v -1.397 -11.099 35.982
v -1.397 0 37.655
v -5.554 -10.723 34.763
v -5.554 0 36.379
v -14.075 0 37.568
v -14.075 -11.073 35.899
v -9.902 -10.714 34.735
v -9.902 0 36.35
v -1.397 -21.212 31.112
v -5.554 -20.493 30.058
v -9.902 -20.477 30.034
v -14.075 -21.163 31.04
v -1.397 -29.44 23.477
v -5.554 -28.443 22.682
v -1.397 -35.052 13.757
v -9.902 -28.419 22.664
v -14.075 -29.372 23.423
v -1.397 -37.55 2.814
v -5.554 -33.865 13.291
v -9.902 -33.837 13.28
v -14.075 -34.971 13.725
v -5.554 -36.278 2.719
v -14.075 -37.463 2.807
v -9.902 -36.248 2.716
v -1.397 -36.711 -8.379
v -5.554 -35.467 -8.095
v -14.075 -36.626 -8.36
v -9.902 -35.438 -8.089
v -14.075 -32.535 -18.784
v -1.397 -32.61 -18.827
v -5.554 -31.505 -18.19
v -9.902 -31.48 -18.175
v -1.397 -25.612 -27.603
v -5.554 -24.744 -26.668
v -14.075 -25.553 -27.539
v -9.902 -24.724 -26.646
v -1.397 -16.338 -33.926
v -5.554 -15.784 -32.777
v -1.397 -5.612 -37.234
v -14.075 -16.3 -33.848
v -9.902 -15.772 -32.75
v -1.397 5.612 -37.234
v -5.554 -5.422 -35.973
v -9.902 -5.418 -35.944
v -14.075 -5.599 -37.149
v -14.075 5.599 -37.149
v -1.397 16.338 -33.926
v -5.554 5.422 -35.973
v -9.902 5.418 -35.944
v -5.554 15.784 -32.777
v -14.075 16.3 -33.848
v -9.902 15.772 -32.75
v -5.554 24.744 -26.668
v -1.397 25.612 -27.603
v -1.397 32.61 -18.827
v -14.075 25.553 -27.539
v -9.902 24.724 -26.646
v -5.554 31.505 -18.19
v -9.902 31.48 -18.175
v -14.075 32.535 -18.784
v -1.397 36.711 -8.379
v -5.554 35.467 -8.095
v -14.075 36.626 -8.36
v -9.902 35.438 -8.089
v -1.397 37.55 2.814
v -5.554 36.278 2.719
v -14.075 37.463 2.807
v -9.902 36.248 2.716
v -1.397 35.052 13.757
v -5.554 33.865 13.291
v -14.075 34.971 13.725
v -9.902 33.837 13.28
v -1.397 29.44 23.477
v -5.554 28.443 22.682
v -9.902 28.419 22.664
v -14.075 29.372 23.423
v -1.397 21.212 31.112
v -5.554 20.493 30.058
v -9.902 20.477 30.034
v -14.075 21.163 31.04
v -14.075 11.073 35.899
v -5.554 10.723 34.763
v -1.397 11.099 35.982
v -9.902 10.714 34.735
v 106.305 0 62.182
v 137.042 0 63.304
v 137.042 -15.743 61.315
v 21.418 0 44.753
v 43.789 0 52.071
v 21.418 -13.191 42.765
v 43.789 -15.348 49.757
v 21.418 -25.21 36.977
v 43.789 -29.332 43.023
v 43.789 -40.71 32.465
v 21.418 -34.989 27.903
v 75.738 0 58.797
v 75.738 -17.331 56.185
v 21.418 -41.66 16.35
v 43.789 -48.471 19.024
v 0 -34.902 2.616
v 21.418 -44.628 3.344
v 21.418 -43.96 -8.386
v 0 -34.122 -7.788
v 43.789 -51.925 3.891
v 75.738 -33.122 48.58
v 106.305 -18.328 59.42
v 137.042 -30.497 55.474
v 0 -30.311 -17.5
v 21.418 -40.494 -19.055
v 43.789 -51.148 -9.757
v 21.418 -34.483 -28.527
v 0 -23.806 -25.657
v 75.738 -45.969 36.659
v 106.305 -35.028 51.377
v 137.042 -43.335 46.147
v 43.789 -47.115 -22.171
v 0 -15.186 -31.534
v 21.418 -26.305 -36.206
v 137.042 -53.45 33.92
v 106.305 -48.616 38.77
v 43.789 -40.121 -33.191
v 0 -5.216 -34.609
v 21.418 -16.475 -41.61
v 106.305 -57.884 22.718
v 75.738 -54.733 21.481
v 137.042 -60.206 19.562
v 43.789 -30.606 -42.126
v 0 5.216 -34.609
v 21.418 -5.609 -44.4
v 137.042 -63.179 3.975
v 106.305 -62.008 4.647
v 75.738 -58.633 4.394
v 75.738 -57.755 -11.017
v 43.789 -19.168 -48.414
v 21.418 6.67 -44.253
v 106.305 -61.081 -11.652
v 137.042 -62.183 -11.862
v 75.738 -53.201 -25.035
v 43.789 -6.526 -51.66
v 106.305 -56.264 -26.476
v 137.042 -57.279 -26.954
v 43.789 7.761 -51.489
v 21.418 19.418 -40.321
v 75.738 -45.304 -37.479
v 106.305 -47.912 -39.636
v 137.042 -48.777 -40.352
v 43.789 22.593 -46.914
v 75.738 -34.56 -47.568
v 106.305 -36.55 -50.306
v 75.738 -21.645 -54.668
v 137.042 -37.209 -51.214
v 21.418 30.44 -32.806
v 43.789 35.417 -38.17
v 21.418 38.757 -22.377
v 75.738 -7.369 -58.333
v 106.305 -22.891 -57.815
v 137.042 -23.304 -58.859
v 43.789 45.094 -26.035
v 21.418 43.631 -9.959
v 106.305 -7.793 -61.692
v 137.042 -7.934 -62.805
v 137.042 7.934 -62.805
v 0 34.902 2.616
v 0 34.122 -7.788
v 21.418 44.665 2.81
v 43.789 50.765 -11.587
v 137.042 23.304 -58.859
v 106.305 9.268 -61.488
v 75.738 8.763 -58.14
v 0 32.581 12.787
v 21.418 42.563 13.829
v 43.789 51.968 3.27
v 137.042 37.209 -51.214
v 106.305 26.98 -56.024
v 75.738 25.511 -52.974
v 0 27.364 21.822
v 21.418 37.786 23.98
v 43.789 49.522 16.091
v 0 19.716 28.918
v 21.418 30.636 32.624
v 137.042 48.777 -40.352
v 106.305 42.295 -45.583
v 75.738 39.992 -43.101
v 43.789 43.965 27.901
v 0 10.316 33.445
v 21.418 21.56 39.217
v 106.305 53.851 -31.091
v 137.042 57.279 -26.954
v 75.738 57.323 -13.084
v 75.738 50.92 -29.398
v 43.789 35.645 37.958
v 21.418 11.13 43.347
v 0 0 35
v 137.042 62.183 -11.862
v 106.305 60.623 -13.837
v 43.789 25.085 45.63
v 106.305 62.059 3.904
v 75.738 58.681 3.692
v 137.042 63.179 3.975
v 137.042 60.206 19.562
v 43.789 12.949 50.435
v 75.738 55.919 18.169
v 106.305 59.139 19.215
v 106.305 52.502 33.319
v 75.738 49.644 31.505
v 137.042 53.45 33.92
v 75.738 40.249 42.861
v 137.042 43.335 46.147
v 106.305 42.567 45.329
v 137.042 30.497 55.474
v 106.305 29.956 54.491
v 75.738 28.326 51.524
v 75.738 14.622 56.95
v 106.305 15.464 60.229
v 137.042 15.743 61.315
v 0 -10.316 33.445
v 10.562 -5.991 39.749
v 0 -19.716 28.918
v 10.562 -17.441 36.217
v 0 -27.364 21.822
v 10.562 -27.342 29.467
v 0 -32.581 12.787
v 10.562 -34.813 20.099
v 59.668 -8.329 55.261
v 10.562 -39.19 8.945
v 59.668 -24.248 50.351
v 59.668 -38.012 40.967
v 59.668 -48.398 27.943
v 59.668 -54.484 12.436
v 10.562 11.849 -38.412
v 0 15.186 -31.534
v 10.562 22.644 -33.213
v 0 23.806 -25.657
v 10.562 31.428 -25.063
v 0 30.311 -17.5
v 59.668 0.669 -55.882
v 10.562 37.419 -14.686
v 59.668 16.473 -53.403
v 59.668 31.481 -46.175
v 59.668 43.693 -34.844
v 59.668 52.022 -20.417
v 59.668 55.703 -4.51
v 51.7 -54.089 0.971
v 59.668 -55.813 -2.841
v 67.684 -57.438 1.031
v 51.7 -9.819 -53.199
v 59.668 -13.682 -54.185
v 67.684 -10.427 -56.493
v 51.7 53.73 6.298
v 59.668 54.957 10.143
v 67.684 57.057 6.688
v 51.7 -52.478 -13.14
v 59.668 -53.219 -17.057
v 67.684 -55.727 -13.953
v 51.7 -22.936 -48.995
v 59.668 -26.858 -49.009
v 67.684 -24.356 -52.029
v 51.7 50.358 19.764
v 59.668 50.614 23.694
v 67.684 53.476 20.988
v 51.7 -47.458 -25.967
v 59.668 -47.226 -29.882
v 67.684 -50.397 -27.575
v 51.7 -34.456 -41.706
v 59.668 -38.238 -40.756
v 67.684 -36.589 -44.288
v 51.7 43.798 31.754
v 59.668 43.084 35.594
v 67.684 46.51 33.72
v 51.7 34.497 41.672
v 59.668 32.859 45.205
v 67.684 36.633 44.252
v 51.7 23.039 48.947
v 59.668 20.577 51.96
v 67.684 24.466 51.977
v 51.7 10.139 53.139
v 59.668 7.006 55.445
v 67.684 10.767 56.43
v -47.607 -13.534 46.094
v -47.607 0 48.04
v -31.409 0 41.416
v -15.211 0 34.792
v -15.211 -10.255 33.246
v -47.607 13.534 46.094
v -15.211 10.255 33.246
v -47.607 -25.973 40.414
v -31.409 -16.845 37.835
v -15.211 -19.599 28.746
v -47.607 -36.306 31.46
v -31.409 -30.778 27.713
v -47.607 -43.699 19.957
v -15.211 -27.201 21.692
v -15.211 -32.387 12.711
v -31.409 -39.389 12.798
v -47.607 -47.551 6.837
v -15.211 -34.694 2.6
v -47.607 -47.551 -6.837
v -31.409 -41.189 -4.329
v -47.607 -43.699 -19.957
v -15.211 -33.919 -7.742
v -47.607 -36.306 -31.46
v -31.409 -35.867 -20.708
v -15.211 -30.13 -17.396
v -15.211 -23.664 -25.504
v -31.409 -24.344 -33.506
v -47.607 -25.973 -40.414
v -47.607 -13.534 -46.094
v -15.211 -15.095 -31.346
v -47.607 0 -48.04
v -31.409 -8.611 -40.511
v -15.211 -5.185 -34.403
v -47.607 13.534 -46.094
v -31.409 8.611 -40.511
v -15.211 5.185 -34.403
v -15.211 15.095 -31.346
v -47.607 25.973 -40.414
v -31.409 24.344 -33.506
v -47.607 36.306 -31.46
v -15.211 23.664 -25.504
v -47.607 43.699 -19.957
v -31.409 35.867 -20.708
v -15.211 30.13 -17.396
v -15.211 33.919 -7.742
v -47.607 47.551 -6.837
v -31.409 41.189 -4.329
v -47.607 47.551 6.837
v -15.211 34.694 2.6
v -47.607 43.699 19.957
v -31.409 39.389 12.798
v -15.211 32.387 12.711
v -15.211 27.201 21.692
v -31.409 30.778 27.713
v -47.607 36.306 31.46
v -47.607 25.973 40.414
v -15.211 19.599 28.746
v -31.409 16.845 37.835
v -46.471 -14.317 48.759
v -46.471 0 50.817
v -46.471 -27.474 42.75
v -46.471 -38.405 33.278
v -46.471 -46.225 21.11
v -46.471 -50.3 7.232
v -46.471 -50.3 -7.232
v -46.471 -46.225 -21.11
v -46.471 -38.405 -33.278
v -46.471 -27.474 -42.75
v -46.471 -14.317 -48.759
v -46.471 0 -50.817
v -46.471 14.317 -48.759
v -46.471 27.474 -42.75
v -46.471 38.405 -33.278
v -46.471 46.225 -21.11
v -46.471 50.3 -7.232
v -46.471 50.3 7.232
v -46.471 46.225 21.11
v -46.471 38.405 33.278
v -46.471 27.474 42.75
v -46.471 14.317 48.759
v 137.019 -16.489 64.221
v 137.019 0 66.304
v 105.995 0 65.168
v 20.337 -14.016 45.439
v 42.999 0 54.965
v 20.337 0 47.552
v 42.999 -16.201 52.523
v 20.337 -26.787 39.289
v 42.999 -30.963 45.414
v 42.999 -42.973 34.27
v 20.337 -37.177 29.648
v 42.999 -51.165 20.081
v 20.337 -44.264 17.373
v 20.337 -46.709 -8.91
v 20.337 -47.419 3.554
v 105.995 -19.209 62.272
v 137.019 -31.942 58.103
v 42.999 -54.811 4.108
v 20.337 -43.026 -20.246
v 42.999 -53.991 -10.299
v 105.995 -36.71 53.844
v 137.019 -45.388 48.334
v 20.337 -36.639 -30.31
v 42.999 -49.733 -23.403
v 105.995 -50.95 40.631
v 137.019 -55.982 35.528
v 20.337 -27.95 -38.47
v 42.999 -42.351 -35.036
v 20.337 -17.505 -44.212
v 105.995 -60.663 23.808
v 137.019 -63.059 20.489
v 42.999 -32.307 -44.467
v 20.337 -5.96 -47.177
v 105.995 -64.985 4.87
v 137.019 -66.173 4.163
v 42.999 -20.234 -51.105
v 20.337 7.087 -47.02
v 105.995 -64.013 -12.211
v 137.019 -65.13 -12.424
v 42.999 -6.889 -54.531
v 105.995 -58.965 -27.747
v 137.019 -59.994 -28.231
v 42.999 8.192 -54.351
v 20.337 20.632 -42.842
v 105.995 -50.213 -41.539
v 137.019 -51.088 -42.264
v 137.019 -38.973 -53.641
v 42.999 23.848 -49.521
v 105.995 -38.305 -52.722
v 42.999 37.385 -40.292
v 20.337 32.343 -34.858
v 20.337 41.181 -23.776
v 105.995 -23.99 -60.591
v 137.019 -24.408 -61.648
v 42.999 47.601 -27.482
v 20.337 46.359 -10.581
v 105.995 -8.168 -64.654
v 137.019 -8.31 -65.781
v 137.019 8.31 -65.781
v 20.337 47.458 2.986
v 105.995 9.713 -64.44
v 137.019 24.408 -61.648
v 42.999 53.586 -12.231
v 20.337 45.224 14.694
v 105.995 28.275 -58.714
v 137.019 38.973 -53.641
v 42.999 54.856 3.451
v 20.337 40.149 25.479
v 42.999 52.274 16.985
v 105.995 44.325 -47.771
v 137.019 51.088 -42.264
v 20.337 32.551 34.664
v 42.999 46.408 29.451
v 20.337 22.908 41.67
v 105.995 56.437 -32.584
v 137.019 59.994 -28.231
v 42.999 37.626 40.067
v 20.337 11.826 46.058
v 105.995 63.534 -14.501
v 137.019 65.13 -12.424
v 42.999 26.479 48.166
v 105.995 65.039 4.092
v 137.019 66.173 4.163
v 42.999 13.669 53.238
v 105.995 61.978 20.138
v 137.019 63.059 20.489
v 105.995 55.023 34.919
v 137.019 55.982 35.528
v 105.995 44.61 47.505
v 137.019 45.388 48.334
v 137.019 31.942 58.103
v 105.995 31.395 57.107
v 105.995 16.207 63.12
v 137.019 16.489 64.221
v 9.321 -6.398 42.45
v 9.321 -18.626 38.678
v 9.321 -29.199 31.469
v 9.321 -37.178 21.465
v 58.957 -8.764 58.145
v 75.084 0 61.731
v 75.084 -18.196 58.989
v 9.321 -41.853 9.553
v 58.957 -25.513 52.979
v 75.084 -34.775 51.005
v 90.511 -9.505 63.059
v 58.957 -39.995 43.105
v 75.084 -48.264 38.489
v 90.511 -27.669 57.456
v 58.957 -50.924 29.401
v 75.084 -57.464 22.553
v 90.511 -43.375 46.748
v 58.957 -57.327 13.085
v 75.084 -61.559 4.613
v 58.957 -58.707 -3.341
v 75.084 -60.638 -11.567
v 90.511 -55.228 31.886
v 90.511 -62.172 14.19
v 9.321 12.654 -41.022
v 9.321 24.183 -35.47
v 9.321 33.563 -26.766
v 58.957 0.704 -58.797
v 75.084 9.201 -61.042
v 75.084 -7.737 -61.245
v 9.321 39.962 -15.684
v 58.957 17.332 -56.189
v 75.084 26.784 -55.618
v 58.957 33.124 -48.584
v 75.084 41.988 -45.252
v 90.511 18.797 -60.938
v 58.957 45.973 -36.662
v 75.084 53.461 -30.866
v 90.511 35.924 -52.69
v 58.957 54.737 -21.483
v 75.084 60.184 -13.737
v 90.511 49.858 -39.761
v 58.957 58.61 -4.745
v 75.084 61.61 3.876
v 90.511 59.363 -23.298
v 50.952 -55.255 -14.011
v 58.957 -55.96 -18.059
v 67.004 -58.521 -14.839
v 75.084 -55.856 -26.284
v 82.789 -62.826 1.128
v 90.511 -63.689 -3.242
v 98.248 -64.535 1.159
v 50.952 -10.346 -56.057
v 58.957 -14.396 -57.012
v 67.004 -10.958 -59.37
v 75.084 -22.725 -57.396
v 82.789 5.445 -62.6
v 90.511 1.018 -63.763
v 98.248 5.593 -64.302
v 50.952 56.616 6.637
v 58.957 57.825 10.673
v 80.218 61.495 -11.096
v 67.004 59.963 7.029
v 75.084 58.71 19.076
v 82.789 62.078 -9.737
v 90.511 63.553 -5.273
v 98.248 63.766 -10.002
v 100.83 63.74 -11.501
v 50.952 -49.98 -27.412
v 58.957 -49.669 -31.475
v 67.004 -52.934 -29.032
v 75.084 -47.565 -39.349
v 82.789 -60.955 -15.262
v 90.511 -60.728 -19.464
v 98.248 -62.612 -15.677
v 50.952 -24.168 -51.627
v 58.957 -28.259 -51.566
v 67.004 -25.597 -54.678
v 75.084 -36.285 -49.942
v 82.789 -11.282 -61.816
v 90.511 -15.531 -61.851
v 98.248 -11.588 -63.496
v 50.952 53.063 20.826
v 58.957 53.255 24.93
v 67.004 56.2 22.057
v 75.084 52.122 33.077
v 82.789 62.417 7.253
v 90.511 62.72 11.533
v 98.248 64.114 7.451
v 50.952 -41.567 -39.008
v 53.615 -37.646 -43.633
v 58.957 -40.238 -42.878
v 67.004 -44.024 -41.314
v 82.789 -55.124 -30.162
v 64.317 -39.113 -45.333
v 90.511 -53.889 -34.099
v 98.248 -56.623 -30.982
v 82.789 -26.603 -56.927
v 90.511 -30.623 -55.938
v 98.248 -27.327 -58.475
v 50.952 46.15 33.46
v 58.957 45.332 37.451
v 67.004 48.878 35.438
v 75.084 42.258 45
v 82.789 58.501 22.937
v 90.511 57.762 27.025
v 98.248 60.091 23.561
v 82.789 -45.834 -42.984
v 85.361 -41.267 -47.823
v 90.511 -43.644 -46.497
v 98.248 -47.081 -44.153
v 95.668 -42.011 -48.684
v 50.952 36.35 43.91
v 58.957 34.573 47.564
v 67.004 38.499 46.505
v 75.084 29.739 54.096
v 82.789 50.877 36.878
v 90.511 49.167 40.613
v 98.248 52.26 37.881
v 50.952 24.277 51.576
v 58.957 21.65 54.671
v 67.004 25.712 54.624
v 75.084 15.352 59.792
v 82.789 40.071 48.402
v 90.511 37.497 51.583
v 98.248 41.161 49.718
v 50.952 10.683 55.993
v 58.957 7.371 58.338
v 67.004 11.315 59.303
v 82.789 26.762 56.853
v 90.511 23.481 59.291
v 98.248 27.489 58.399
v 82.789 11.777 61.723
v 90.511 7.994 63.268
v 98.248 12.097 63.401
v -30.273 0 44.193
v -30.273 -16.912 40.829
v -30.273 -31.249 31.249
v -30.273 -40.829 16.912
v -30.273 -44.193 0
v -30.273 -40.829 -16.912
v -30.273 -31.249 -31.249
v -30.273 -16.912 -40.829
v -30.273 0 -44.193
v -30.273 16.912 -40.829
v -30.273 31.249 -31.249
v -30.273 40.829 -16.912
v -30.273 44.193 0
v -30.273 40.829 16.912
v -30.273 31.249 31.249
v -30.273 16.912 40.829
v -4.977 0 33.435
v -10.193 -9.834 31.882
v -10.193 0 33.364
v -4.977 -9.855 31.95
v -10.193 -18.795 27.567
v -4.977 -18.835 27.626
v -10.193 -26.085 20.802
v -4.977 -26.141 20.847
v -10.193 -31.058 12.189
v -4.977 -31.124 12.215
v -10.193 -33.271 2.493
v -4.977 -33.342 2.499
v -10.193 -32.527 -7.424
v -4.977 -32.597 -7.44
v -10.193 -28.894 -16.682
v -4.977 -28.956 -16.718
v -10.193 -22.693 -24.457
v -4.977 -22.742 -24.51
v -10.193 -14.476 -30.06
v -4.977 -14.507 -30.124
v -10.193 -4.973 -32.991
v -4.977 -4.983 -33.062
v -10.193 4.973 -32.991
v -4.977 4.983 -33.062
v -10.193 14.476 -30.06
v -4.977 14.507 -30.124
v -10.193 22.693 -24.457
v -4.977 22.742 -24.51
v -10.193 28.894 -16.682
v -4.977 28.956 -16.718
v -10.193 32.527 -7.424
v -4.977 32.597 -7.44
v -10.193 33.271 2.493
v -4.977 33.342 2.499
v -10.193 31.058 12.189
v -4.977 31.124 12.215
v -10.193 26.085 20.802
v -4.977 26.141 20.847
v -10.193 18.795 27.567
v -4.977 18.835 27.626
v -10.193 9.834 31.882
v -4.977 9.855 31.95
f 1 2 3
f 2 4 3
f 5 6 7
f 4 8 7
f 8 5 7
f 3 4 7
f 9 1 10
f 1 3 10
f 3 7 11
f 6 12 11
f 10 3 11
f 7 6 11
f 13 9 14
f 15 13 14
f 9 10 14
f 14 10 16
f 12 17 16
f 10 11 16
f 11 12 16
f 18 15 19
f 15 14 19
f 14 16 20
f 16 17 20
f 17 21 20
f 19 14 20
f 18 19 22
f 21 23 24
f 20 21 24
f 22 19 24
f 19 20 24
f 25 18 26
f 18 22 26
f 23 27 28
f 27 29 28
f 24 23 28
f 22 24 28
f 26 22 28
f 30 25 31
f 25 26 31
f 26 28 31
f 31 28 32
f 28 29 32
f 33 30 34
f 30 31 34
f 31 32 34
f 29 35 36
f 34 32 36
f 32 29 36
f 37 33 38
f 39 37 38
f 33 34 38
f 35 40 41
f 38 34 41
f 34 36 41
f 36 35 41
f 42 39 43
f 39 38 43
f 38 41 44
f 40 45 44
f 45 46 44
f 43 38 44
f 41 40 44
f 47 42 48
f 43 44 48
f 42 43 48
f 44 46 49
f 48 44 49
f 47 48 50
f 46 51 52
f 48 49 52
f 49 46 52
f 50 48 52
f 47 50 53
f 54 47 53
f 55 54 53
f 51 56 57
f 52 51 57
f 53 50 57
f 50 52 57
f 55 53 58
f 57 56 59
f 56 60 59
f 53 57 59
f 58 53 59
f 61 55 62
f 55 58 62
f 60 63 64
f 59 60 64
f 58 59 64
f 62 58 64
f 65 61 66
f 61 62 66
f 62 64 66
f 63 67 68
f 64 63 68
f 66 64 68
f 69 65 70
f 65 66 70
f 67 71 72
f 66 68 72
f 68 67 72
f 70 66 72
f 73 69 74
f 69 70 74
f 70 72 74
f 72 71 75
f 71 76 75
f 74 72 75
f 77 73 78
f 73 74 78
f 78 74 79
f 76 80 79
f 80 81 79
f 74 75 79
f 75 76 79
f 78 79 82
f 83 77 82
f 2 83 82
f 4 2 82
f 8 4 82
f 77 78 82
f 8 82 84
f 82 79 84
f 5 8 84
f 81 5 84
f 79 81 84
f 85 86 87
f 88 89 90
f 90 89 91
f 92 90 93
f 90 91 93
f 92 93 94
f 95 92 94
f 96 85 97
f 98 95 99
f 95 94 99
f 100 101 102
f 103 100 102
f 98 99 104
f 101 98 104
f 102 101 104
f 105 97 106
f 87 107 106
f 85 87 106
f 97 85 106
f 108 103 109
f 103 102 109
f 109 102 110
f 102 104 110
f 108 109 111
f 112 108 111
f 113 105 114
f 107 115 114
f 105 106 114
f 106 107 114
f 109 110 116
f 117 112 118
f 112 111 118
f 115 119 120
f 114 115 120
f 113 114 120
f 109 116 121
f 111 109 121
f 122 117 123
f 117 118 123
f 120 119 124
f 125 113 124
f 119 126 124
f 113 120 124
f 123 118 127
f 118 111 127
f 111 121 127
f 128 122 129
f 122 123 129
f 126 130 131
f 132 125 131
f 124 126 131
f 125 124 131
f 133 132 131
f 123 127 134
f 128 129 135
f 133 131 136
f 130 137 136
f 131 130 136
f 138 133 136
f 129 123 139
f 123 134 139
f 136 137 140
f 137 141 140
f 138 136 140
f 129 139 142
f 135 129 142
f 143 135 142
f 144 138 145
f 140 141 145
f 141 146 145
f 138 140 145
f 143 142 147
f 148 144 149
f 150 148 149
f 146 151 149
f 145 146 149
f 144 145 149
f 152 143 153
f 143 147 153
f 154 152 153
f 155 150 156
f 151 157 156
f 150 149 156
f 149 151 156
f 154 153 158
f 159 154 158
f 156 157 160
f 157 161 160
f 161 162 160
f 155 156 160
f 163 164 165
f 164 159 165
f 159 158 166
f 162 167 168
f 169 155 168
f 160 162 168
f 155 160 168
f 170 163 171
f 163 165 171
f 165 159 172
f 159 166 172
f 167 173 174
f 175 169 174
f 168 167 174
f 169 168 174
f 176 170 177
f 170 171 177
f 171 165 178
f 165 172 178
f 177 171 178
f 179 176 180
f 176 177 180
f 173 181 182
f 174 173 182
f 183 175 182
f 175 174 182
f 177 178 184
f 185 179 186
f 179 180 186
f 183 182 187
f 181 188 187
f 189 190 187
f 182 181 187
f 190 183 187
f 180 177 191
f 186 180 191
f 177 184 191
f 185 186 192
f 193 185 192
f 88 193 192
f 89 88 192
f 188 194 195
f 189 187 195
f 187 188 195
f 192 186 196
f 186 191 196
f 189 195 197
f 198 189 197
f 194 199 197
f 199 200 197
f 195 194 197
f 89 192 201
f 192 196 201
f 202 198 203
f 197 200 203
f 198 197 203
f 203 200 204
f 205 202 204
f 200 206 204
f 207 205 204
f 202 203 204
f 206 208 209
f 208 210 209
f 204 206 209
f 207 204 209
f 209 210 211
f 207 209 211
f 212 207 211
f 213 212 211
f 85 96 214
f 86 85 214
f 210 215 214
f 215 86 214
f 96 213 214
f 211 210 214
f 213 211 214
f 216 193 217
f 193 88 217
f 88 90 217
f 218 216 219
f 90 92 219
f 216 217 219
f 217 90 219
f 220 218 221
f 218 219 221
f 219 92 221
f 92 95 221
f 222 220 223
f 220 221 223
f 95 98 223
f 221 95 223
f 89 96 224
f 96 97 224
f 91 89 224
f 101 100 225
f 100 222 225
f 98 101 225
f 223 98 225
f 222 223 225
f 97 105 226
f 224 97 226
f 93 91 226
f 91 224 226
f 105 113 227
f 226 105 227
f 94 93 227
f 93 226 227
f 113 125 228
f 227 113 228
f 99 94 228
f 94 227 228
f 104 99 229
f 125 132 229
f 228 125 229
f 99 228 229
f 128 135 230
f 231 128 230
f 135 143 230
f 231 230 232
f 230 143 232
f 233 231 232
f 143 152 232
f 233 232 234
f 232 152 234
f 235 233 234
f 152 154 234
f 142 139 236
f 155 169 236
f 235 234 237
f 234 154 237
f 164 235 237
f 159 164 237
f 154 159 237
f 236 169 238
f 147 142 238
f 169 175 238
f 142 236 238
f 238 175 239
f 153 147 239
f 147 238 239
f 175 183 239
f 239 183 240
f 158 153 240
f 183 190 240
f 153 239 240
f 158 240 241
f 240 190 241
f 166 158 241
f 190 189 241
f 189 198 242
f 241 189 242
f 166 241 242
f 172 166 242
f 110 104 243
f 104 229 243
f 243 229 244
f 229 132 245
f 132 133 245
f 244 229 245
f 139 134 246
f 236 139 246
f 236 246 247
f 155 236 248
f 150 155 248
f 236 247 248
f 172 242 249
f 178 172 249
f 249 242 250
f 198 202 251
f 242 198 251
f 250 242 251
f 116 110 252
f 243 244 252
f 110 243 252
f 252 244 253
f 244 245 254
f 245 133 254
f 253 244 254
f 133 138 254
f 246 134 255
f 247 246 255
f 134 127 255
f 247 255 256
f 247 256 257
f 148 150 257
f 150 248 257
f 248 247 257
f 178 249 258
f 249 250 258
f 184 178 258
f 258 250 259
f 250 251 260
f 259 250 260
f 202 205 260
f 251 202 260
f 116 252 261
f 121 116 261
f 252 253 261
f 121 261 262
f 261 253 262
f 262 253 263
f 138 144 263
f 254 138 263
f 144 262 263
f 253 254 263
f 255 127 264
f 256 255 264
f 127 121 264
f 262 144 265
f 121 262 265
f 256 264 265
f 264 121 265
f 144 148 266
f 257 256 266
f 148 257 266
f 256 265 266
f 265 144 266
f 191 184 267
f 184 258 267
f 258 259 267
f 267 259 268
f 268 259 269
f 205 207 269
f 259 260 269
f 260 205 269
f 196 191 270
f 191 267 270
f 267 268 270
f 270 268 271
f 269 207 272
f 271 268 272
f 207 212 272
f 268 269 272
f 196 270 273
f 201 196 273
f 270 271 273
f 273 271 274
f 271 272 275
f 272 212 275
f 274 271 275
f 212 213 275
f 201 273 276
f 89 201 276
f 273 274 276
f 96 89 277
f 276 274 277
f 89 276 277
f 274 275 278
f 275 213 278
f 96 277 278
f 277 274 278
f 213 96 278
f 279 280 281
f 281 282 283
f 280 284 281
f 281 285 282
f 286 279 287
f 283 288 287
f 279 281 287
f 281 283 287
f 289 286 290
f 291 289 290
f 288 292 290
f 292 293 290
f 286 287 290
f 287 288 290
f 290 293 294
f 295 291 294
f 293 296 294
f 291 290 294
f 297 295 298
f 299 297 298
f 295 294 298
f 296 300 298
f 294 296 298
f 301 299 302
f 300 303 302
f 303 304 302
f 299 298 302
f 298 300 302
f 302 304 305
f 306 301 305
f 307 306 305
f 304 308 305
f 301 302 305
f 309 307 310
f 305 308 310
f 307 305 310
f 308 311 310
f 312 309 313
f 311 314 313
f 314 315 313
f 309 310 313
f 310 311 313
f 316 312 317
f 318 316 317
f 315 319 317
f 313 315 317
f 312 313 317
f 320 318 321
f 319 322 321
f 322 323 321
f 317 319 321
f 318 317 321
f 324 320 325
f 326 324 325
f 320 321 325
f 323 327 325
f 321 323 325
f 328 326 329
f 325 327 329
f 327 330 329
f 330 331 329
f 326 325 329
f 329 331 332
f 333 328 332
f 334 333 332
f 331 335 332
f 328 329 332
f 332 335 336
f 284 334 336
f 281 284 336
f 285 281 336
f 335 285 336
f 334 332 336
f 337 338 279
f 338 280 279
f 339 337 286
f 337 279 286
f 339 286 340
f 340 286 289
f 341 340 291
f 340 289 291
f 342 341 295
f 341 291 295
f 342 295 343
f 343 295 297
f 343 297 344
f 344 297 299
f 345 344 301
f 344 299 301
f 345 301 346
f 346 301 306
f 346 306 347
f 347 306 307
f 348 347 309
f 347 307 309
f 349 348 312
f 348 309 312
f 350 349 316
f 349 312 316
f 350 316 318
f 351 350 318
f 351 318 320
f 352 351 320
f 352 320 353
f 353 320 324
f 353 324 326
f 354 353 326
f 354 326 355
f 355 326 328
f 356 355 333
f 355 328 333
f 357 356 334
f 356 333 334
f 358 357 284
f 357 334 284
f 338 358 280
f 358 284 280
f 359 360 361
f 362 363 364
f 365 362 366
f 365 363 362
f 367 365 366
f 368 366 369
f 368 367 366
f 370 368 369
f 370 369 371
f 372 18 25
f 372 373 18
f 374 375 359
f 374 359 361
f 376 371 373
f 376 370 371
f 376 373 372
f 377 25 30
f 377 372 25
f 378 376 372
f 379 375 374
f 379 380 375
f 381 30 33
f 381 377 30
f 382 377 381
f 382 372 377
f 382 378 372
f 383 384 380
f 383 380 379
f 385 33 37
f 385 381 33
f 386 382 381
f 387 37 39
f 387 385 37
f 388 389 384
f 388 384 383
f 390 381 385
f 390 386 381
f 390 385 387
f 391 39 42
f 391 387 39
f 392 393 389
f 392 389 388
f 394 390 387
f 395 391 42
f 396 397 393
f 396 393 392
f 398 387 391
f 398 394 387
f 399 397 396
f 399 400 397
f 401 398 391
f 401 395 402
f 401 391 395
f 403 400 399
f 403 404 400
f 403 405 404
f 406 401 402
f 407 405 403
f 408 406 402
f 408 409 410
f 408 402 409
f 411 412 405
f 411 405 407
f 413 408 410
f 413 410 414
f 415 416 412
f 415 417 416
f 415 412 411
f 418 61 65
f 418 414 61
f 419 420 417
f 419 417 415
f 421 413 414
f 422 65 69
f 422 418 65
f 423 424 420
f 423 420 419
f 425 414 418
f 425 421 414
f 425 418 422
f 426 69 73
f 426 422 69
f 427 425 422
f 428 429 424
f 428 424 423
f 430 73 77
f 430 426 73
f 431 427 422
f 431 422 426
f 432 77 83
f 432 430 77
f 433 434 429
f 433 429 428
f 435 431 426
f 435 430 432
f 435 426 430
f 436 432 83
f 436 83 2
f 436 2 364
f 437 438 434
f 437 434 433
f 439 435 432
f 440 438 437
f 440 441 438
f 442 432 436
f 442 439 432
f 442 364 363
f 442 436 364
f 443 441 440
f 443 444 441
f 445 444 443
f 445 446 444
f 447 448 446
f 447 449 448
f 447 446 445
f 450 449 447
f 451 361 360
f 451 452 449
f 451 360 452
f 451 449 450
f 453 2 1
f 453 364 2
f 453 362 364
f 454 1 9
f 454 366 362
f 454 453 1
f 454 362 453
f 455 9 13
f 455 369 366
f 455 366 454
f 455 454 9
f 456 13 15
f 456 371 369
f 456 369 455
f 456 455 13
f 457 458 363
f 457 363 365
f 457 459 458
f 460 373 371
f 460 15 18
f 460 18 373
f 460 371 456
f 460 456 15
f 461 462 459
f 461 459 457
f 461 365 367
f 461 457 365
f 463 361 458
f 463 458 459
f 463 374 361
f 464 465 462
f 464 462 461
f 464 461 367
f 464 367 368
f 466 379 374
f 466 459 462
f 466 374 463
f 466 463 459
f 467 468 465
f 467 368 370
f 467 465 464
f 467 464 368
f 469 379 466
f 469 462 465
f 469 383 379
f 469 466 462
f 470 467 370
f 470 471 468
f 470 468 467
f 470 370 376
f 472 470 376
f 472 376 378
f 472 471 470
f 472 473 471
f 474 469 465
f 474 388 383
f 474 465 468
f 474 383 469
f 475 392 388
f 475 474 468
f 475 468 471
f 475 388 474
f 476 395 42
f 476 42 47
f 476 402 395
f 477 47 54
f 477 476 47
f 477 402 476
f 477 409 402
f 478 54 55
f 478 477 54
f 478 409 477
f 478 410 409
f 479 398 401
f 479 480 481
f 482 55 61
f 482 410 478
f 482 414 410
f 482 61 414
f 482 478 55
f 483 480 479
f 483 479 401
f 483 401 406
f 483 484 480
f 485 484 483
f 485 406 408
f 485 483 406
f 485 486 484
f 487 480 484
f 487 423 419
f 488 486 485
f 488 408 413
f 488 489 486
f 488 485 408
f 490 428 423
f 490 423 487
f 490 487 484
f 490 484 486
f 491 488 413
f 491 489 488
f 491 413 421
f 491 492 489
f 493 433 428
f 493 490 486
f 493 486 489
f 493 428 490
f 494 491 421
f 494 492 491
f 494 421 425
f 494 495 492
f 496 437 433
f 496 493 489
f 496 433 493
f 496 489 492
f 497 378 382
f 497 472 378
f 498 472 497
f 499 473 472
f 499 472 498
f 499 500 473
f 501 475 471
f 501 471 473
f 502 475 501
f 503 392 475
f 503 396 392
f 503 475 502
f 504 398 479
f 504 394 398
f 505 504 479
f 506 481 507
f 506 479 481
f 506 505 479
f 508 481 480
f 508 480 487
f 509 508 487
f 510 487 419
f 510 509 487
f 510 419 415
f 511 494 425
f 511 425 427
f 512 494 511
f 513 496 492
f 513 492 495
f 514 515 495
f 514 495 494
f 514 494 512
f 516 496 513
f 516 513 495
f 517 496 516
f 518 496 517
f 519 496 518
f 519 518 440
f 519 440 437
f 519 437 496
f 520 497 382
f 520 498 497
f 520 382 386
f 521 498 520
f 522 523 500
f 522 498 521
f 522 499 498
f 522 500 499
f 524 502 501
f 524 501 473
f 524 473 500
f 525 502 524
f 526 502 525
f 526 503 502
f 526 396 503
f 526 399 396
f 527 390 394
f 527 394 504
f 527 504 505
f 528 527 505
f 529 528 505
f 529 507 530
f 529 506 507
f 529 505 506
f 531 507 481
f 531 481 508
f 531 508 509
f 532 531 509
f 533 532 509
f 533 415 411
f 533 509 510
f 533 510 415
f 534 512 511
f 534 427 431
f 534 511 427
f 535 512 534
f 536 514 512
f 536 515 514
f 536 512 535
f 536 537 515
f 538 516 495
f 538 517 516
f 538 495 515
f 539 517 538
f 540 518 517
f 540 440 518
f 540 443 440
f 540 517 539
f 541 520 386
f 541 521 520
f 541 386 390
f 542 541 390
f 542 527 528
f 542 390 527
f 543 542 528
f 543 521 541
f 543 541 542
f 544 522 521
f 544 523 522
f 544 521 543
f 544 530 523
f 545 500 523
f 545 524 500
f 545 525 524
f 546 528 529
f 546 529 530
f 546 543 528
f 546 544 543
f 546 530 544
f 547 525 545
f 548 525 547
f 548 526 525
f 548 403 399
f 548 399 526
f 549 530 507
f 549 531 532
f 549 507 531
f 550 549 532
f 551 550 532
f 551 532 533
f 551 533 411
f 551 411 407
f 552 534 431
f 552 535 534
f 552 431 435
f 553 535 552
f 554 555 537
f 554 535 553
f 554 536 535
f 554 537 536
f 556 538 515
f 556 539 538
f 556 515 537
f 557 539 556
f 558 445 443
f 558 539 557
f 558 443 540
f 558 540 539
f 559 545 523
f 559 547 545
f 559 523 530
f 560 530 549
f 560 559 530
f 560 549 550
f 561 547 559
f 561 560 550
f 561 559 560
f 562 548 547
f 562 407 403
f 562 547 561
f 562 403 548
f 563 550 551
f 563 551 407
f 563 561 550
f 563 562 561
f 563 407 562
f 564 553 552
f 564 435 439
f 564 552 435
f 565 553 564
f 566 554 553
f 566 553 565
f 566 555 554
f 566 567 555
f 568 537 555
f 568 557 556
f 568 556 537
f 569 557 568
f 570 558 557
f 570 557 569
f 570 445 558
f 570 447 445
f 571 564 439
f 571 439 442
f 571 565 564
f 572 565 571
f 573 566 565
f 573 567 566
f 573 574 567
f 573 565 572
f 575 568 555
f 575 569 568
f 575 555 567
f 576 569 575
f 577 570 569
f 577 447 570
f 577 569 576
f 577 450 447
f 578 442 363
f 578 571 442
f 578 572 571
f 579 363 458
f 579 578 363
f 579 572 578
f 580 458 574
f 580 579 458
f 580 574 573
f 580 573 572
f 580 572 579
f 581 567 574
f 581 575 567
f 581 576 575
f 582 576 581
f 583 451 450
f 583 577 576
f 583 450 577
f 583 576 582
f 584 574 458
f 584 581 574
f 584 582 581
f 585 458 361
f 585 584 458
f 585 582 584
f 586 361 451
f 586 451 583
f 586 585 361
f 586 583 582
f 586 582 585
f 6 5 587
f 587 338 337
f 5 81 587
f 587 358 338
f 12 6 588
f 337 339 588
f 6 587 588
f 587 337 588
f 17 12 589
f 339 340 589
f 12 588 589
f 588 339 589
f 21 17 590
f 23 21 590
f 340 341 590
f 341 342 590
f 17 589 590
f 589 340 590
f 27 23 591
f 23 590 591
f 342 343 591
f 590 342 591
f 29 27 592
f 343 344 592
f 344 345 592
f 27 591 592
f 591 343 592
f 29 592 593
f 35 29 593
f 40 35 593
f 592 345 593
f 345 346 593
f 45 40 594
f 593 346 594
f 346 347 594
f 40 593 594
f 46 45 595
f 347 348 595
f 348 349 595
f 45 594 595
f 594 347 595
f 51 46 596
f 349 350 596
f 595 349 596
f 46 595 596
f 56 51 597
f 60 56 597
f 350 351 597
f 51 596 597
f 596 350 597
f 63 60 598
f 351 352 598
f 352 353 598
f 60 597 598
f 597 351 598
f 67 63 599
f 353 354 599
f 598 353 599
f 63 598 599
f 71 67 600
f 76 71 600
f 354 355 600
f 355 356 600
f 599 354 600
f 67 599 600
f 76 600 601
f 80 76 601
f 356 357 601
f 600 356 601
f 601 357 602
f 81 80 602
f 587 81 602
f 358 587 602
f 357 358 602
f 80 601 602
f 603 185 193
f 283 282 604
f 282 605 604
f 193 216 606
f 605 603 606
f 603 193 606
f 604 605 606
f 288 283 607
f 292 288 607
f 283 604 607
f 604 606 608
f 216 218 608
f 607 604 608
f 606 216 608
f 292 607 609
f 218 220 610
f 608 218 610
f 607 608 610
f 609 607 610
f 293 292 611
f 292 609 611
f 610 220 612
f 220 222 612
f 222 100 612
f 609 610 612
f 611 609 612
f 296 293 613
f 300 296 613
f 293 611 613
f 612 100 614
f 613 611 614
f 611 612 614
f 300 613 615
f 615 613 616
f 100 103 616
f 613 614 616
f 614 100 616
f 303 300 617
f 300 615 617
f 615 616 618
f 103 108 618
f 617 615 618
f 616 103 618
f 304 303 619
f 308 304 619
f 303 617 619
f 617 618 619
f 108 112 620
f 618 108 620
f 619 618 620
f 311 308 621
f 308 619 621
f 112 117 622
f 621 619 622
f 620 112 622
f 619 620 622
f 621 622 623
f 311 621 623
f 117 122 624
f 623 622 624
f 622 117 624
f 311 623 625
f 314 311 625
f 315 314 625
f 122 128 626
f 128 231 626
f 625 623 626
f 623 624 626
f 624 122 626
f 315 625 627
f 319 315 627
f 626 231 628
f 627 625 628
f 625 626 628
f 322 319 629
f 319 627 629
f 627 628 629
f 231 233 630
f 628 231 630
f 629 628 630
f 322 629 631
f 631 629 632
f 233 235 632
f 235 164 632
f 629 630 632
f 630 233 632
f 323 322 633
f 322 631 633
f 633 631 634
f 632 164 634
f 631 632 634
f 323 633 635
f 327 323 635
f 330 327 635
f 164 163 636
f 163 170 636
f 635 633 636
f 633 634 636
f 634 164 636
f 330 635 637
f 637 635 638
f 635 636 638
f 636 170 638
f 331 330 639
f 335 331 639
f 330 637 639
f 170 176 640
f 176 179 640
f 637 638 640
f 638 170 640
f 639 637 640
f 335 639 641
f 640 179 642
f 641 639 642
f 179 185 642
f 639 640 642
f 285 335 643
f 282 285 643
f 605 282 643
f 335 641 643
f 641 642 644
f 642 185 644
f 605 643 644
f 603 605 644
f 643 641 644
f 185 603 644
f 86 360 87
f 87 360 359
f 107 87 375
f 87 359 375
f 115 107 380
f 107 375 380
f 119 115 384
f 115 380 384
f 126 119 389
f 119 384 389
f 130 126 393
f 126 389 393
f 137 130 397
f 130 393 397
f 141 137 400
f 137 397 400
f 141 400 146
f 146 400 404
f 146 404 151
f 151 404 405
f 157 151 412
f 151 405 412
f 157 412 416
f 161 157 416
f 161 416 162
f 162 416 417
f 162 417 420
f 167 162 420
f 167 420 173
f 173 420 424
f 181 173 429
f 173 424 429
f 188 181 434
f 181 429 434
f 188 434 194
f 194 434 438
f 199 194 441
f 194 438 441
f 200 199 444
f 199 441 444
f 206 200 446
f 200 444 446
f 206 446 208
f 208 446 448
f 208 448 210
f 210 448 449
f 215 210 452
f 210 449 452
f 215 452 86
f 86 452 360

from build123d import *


with BuildPart() as part:
    # Sketch1 → Revolve1 (revolve)
    with BuildSketch(Plane.XY, mode=Mode.PRIVATE) as revolve1_sk:
        with BuildLine():
            Line((-14.07542386, 37.568273806), (-46.470976776, 50.816977564))
            Line((-46.470976776, 50.816977564), (-47.606579955, 48.040215886))
            Line((-47.606579955, 48.040215886), (-15.211027039, 34.791512127))
            ThreePointArc((-15.211027039, 34.791512127), (-7.582403195, 33.20965431), (0, 35))
            add(Edge.make_bspline(
                [(0, 35), (0.554982885, 35.292078076), (1.529548525, 35.804975437), (2.937168515, 36.528646974), (4.670505008, 37.403247331), (6.441777952, 38.270978901), (8.72353094, 39.355824676), (10.60527745, 40.222883125), (13.032290671, 41.306133357), (15.036209453, 42.17114709), (17.087094086, 43.02680226), (18.673403682, 43.673231436), (20.856984777, 44.541896716), (23.094257988, 45.39904617), (25.989126484, 46.46638141), (28.386871241, 47.315207138), (30.84541355, 48.150088409), (32.753517217, 48.779526201), (34.708527913, 49.405481958), (36.712155185, 50.027535636), (39.482315388, 50.860724256), (42.327286953, 51.67455728), (45.249208852, 52.468327667), (47.52394585, 53.064185949), (50.676189667, 53.859346127), (53.917505014, 54.629238229), (57.250572852, 55.37298295), (59.851417574, 55.928080058), (62.525243047, 56.472822795), (65.274940322, 57.00632226), (69.098543953, 57.711093835), (74.092224808, 58.5579122), (79.241968973, 59.331198352), (83.546726971, 59.915803354), (88.114361176, 60.491749339), (92.827871443, 61.016524652), (97.692576244, 61.488322173), (101.514881987, 61.821919317), (105.461815144, 62.128127777), (109.539052294, 62.404835389), (113.752598134, 62.649957567), (118.108825402, 62.86101428), (122.614486305, 63.035832281), (127.276766252, 63.170626485), (132.103271493, 63.266601223), (135.376710135, 63.291555158), (137.04201, 63.30425)],
                knots=[0, 0, 0, 0, 0.013316339, 0.023383869, 0.033606485, 0.054540129, 0.065262967, 0.087252117, 0.09853175, 0.12169581, 0.133595111, 0.145716248, 0.158067223, 0.18349317, 0.196585983, 0.223578759, 0.23749902, 0.251715999, 0.266240967, 0.281085577, 0.296262138, 0.327662633, 0.343913879, 0.360551775, 0.377591616, 0.412941995, 0.43128705, 0.450103019, 0.469409391, 0.489226518, 0.509575972, 0.551963387, 0.596767231, 0.620142346, 0.644205069, 0.694519486, 0.720838909, 0.747981665, 0.775986766, 0.804895701, 0.834752506, 0.865603944, 0.897499706, 0.930492752, 0.964639505, 1, 1, 1, 1], degree=3))
            Line((137.04201, 63.30425), (137.019141195, 66.304162835))
            add(Edge.make_bspline(
                [(-1.3971712, 37.654790507), (-0.745970647, 37.99750631), (-0.086364061, 38.34452892), (1.243299523, 39.031913103), (1.909234943, 39.371004332), (3.913812499, 40.377229123), (5.257968525, 41.032169281), (9.31154575, 42.949933492), (12.042210127, 44.165642688), (20.305949906, 47.631351256), (25.910290073, 49.699677139), (37.249046848, 53.398748809), (42.983668181, 55.029852707), (54.5380921, 57.905889985), (60.358000499, 59.150914609), (72.050774464, 61.303130557), (77.923763431, 62.210360725), (89.700224637, 63.729913919), (95.603725032, 64.342241655), (107.425404783, 65.309182419), (113.343652658, 65.663660588), (122.224200636, 66.026144413), (125.184186024, 66.11797589), (129.625148543, 66.218034256), (131.108100806, 66.244680865), (134.070837435, 66.281699318), (135.547424791, 66.29294371), (137.019141195, 66.304162835)],
                knots=[0, 0, 0, 0, 0.015625, 0.015625, 0.03125, 0.03125, 0.0625, 0.0625, 0.125, 0.125, 0.25, 0.25, 0.375, 0.375, 0.5, 0.5, 0.625, 0.625, 0.75, 0.75, 0.875, 0.875, 0.9375, 0.9375, 0.96875, 0.96875, 1, 1, 1, 1], degree=3))
            ThreePointArc((-1.3971712, 37.654790507), (-7.726707385, 36.206181683), (-14.07542386, 37.568273806))
        make_face()
    revolve(revolve1_sk.sketch.rotate(Axis((-87.932781481, 0, 0), (1, 0, 0)), 90), axis=Axis((-87.932781481, 0, 0), (1, 0, 0)))


solid = part.part
